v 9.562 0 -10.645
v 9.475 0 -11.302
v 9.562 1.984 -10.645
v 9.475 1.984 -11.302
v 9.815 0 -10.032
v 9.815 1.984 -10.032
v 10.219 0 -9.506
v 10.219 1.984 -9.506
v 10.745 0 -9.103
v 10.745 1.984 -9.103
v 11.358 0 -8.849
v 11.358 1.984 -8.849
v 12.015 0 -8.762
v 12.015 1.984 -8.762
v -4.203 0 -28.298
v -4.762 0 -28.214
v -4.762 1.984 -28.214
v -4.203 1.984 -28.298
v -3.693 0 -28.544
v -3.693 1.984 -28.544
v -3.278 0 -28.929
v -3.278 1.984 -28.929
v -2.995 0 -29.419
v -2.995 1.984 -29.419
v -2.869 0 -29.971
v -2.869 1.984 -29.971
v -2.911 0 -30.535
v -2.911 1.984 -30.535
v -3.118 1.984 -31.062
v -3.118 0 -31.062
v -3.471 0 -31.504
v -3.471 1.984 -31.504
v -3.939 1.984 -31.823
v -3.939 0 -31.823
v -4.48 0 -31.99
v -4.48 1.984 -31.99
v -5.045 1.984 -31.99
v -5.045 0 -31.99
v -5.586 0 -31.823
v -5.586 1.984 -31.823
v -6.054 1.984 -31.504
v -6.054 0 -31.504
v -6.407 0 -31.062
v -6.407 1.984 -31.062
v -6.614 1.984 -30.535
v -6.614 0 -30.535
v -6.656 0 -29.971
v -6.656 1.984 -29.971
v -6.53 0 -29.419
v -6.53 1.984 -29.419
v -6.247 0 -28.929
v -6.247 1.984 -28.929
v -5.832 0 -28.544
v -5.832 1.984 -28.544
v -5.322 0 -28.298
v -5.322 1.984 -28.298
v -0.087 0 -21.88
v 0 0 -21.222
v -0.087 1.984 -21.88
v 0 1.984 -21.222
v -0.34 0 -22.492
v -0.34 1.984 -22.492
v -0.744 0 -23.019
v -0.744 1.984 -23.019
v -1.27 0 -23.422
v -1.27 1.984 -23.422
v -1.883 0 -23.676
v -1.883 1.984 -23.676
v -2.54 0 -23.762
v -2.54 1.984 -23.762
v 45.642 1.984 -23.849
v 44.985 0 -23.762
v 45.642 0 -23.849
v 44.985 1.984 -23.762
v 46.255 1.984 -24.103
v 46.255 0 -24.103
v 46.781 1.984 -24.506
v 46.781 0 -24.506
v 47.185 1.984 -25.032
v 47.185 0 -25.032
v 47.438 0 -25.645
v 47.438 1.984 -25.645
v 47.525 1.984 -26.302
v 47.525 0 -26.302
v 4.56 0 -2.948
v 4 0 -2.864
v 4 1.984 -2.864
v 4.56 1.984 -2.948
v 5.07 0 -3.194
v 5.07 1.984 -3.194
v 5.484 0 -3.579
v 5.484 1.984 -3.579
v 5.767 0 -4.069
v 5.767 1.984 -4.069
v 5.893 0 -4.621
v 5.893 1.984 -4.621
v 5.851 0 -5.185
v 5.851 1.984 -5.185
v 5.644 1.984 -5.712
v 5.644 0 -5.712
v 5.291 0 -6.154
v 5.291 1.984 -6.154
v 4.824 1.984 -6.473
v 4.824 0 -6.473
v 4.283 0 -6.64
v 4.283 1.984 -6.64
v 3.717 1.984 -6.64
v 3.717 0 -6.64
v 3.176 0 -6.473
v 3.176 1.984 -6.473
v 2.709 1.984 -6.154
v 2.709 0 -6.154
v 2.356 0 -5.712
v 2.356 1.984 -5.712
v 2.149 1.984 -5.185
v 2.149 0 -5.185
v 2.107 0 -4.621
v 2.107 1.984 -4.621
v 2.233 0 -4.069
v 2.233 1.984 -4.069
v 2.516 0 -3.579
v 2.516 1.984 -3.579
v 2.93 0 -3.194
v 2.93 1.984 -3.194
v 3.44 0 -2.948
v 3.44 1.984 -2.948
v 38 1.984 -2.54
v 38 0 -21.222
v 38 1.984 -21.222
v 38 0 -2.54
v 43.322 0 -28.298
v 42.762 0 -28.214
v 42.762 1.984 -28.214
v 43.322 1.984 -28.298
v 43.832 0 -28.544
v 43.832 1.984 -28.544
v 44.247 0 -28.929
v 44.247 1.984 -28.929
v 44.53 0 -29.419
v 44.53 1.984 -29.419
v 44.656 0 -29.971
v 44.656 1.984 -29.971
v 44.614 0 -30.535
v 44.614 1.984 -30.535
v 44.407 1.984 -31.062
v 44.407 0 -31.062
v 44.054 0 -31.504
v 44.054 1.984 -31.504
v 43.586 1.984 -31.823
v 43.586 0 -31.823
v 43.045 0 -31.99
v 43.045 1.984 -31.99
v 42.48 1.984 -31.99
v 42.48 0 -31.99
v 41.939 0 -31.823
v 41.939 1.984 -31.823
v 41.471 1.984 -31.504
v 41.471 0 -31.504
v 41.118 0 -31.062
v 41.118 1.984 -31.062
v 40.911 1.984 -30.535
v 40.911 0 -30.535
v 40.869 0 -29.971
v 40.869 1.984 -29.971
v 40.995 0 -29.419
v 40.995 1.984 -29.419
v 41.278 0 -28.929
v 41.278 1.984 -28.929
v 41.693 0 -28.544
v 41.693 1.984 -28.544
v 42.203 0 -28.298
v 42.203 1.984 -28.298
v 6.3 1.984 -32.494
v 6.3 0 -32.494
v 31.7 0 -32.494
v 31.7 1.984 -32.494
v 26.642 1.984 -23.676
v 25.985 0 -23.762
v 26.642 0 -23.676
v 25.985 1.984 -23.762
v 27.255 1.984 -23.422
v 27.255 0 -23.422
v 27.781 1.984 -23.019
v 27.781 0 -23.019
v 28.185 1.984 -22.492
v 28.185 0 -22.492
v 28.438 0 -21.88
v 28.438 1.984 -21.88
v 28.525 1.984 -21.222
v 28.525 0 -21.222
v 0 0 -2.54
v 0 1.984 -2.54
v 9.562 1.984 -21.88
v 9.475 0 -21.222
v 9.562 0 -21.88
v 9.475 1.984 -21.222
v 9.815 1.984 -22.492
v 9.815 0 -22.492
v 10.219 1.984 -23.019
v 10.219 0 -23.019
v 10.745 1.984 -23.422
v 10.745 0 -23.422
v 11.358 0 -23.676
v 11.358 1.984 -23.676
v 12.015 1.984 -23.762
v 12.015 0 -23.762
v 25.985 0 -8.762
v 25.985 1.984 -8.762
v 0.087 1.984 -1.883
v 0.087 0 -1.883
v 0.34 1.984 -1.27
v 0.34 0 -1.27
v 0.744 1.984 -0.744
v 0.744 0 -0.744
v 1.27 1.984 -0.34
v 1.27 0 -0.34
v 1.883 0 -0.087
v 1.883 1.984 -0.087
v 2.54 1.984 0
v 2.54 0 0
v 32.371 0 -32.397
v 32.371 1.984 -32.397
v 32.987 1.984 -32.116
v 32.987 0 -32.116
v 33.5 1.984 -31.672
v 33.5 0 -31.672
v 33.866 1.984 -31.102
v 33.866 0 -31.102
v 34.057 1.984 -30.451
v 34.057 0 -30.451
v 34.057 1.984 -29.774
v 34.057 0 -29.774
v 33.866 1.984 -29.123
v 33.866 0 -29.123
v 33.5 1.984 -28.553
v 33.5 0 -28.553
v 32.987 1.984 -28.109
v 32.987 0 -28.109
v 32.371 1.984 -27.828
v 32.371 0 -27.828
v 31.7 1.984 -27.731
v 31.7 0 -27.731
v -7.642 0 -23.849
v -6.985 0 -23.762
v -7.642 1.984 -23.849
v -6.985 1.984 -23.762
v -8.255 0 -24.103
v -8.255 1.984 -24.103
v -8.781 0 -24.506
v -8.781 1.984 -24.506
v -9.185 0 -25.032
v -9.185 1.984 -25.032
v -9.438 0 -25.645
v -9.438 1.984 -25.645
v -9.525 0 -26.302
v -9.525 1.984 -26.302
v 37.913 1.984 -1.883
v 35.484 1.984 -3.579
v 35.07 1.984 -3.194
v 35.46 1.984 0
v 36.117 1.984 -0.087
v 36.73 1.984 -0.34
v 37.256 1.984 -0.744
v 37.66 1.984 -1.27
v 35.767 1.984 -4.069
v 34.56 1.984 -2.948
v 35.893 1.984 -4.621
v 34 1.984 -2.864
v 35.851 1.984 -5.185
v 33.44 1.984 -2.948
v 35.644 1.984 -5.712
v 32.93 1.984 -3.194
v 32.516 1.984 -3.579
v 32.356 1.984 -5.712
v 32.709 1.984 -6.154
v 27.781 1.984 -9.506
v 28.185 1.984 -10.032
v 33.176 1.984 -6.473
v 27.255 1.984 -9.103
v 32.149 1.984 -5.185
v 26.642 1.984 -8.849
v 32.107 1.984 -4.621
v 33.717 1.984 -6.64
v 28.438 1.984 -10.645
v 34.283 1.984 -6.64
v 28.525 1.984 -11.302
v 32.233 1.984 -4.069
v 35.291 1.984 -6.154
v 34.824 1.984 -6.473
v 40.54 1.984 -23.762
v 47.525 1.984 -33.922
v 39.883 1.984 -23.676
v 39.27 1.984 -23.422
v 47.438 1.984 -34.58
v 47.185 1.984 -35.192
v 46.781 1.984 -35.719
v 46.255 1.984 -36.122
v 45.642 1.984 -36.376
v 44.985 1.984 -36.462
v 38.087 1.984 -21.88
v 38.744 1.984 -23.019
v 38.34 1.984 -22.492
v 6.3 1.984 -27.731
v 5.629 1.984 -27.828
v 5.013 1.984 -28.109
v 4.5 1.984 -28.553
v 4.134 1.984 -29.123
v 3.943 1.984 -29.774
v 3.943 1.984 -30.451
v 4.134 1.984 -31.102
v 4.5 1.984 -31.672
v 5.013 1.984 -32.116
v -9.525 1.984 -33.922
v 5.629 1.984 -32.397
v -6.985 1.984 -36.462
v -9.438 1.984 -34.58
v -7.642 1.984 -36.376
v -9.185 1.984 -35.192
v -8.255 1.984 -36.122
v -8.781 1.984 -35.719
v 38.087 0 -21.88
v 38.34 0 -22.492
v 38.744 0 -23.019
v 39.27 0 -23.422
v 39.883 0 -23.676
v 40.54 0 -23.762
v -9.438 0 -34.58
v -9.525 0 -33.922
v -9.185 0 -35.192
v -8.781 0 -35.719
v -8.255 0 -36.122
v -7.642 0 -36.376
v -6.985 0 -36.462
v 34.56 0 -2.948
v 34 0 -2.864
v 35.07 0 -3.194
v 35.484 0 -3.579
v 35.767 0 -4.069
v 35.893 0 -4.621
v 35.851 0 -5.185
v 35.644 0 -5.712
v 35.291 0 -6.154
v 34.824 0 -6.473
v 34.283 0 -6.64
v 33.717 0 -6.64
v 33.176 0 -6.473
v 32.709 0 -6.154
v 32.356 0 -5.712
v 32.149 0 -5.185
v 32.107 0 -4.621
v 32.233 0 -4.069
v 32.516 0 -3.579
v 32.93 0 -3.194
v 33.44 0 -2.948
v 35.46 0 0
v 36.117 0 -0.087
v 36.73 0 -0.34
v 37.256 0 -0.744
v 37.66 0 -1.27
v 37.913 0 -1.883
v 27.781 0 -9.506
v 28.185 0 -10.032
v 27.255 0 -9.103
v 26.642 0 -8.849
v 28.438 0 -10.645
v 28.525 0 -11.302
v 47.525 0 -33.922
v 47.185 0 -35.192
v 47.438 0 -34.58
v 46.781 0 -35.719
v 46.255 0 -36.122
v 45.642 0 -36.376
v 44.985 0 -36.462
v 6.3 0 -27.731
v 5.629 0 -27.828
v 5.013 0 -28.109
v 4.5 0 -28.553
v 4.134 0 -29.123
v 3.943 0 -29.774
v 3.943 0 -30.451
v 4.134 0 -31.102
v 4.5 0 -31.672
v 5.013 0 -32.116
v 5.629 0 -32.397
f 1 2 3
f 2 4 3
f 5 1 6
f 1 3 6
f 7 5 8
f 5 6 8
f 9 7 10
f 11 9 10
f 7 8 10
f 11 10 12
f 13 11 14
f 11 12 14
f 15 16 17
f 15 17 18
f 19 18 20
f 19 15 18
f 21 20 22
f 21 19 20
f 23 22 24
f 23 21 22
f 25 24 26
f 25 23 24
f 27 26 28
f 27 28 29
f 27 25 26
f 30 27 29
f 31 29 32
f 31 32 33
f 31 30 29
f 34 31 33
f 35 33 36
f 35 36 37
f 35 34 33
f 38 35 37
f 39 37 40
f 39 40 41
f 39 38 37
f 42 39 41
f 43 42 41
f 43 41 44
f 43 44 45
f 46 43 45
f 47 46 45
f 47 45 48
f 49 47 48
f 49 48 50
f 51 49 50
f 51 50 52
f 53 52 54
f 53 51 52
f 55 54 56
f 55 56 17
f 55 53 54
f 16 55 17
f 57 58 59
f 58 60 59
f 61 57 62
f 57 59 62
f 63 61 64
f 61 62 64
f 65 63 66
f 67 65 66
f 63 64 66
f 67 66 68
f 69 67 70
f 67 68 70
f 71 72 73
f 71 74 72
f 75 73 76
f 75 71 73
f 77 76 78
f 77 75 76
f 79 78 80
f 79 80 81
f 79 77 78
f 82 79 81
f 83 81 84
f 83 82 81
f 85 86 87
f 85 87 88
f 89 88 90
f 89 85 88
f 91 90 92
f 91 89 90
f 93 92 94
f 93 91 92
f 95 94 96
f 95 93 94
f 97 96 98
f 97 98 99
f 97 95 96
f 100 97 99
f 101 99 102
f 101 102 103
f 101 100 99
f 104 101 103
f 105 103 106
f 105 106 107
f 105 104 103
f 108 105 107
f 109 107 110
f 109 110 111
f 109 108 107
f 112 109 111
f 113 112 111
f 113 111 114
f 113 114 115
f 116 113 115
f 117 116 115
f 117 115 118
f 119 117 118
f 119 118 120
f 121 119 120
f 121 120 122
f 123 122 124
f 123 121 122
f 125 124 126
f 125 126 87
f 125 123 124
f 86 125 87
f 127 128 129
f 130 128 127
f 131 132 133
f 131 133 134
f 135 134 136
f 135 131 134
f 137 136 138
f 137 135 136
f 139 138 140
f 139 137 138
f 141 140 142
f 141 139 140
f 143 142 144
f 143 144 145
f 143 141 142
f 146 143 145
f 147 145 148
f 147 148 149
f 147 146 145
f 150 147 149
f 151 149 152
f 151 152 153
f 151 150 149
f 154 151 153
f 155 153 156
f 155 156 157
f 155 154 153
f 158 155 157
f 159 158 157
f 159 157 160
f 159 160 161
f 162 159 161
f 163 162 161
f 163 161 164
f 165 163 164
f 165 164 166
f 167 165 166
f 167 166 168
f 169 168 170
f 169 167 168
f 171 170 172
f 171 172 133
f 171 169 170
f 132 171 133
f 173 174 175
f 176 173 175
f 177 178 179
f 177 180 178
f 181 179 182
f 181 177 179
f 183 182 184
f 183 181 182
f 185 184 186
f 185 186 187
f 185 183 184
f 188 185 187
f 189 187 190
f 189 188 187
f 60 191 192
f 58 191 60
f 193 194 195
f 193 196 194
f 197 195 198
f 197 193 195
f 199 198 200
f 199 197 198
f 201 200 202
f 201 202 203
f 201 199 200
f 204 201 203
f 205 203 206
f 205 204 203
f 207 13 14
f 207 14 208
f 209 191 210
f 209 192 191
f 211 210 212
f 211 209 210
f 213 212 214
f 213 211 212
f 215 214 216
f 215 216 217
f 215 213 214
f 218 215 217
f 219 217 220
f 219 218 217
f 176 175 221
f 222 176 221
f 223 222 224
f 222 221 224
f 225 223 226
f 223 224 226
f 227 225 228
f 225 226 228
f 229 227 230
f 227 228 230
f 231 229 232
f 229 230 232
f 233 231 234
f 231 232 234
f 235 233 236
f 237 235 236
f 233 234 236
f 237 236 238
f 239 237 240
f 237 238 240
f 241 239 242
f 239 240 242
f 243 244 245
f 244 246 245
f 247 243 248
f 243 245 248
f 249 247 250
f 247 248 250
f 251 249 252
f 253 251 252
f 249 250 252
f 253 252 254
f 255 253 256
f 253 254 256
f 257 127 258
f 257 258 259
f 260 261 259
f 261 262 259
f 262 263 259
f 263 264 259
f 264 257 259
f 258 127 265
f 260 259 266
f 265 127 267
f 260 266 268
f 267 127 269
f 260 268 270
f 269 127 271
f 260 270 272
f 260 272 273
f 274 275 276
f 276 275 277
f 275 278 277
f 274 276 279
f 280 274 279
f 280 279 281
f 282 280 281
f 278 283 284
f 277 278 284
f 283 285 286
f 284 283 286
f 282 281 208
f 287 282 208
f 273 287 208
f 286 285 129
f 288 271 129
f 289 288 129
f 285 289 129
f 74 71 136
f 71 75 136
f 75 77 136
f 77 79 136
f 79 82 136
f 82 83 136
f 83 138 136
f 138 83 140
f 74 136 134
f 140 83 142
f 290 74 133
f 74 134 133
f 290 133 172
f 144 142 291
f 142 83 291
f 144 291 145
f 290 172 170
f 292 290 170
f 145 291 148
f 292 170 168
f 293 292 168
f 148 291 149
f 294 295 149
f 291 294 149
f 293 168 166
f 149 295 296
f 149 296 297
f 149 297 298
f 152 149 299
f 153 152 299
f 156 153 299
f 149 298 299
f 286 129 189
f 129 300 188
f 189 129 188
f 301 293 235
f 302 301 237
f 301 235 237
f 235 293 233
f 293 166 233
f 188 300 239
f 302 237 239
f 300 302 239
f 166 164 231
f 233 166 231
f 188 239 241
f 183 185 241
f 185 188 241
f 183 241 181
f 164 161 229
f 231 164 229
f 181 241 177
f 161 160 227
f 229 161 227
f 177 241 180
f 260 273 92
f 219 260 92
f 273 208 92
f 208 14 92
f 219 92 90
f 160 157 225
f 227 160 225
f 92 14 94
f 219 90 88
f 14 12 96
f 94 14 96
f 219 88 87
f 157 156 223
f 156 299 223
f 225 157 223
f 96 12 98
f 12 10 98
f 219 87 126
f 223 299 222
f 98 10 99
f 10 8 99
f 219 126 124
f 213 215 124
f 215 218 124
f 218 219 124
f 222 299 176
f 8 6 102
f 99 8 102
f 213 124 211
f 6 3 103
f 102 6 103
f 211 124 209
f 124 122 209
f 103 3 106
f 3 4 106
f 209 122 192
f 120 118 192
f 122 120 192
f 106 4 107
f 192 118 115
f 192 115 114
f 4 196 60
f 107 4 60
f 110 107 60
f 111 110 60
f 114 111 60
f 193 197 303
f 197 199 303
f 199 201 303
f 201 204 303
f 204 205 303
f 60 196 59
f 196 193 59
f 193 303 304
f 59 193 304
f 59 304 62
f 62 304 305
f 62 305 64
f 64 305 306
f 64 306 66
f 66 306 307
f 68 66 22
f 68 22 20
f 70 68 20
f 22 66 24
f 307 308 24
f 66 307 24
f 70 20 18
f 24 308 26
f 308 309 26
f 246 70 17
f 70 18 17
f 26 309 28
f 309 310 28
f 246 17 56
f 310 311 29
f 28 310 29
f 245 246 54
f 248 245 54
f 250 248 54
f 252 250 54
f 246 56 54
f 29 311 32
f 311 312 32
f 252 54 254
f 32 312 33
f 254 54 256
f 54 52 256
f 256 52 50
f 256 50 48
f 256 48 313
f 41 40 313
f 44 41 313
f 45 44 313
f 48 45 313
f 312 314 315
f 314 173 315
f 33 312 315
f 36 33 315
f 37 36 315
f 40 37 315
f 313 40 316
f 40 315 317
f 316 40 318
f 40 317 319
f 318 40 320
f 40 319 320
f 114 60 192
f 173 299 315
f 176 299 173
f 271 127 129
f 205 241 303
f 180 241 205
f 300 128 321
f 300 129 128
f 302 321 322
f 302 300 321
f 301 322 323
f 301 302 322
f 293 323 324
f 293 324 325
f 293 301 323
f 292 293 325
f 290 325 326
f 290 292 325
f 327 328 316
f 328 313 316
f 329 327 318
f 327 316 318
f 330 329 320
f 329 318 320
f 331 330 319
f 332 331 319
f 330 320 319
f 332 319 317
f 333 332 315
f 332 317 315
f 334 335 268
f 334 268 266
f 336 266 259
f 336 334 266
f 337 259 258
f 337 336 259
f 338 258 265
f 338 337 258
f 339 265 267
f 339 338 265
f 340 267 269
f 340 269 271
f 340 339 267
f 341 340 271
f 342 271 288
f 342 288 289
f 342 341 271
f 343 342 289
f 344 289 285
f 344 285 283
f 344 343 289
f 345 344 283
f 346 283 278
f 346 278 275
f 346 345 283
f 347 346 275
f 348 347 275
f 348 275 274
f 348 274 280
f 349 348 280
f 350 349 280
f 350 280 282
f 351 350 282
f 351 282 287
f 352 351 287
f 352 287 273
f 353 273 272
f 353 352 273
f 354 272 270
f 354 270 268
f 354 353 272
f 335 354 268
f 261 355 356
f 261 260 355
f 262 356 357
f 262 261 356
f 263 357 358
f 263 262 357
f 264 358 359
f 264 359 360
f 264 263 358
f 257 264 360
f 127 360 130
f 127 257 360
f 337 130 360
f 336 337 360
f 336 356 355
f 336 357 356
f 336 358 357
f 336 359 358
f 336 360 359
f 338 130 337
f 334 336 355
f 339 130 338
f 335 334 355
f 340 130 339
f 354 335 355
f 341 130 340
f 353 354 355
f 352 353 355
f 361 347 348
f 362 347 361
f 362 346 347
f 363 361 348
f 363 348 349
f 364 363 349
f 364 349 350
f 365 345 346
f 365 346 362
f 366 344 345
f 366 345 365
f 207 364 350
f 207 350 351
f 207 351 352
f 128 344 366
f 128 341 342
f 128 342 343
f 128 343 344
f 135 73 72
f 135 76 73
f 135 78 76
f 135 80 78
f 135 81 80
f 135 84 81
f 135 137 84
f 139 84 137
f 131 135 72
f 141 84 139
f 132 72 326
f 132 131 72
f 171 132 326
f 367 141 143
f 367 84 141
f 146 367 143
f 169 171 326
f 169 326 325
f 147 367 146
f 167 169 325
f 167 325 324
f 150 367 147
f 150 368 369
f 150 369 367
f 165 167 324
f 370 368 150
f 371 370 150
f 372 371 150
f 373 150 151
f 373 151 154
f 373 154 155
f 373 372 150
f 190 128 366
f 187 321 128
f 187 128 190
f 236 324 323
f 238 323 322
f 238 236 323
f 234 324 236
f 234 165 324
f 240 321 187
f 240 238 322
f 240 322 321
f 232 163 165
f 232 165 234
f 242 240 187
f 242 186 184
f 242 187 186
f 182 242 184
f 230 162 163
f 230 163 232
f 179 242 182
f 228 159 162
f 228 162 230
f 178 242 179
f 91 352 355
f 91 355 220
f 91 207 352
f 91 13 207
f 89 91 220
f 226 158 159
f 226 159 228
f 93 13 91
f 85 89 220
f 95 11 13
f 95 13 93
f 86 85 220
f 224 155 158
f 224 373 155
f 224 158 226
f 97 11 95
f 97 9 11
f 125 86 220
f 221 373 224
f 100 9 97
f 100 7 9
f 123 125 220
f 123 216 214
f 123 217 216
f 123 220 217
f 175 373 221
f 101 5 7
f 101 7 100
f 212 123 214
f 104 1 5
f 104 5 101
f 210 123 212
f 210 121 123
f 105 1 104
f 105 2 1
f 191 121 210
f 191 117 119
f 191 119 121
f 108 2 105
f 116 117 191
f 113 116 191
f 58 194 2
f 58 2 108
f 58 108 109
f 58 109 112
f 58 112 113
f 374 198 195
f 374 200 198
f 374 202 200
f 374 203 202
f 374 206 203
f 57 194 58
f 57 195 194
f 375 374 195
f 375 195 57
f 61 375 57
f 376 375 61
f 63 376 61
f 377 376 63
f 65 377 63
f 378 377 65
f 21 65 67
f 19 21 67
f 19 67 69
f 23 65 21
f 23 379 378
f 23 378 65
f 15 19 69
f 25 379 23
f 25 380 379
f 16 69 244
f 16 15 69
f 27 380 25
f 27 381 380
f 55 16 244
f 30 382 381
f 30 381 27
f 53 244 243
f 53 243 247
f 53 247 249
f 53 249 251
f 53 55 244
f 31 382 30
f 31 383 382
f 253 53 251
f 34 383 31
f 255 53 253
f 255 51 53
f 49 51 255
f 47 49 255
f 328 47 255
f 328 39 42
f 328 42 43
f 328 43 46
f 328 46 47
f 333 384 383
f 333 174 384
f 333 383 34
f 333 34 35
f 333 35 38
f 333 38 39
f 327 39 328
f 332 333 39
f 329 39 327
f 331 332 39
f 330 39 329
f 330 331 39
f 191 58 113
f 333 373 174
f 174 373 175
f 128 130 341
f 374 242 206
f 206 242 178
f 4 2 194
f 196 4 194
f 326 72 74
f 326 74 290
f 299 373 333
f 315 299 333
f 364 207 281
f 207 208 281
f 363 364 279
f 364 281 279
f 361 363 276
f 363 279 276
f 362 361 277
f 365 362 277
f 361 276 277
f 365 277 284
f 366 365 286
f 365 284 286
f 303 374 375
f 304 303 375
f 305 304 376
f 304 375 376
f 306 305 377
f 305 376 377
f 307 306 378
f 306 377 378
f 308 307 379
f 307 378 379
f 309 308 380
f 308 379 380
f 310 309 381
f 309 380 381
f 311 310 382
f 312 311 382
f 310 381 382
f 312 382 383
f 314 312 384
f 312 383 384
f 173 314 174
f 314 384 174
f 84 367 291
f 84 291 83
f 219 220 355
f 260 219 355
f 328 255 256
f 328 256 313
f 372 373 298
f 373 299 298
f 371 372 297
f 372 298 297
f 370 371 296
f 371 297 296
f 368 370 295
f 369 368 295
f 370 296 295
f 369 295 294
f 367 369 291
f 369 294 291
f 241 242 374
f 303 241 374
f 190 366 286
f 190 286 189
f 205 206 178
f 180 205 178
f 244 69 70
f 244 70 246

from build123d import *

# Parameters (mm, degrees)
SKETCH2_R           = 1.89865
SKETCH2_W           = 19.05
SKETCH2_H           = 15
BOSS_EXTRUDE1_DEPTH = 1.984375
FILLET1_R           = 2.54


with BuildPart() as part:
    # Sketch2 → Boss-Extrude1 (new body)
    with BuildSketch(Plane(origin=(0, 0, 0), x_dir=(1, 0, 0), z_dir=(0, 1, 0))):
        Polygon((0, 0), (0, 23.7625), (-9.525, 23.7625), (-9.525, 36.4625), (0, 36.4625), (38, 36.4625), (47.525, 36.4625), (47.525, 23.7625), (38, 23.7625), (38, 0), (27.055231083, 0), align=None)
        with Locations(Location((34, 4.7625, 0), (0, 0, 270))):
            Circle(SKETCH2_R, mode=Mode.SUBTRACT)
        with Locations(Location((4, 4.7625, 0), (0, 0, 270))):
            Circle(SKETCH2_R, mode=Mode.SUBTRACT)
        with Locations(Location((-4.7625, 30.1125, 0), (0, 0, 270))):
            Circle(SKETCH2_R, mode=Mode.SUBTRACT)
        with Locations(Location((42.7625, 30.1125, 0), (0, 0, 270))):
            Circle(SKETCH2_R, mode=Mode.SUBTRACT)
        with Locations((19, 16.2625)):
            Rectangle(SKETCH2_W, SKETCH2_H, mode=Mode.SUBTRACT)
        with BuildLine():
            Line((6.3, 32.49375), (31.7, 32.49375))
            ThreePointArc((31.7, 32.49375), (34.08125, 30.1125), (31.7, 27.73125))
            Line((31.7, 27.73125), (6.3, 27.73125))
            ThreePointArc((6.3, 27.73125), (3.91875, 30.1125), (6.3, 32.49375))
        make_face(mode=Mode.SUBTRACT)
    extrude(amount=BOSS_EXTRUDE1_DEPTH)

    # Fillet1
    fillet1_edges = [part.edges().sort_by_distance(p)[0] for p in [
        (0, 0.9921875, 0),
        (0, 0.9921875, -23.7625),
        (-9.525, 0.9921875, -23.7625),
        (-9.525, 0.9921875, -36.4625),
        (47.525, 0.9921875, -36.4625),
        (47.525, 0.9921875, -23.7625),
        (38, 0.9921875, -23.7625),
        (38, 0.9921875, 0),
        (28.525, 0.9921875, -8.7625),
        (28.525, 0.9921875, -23.7625),
        (9.475, 0.9921875, -23.7625),
        (9.475, 0.9921875, -8.7625),
    ]]
    fillet(fillet1_edges, radius=FILLET1_R)


solid = part.part
